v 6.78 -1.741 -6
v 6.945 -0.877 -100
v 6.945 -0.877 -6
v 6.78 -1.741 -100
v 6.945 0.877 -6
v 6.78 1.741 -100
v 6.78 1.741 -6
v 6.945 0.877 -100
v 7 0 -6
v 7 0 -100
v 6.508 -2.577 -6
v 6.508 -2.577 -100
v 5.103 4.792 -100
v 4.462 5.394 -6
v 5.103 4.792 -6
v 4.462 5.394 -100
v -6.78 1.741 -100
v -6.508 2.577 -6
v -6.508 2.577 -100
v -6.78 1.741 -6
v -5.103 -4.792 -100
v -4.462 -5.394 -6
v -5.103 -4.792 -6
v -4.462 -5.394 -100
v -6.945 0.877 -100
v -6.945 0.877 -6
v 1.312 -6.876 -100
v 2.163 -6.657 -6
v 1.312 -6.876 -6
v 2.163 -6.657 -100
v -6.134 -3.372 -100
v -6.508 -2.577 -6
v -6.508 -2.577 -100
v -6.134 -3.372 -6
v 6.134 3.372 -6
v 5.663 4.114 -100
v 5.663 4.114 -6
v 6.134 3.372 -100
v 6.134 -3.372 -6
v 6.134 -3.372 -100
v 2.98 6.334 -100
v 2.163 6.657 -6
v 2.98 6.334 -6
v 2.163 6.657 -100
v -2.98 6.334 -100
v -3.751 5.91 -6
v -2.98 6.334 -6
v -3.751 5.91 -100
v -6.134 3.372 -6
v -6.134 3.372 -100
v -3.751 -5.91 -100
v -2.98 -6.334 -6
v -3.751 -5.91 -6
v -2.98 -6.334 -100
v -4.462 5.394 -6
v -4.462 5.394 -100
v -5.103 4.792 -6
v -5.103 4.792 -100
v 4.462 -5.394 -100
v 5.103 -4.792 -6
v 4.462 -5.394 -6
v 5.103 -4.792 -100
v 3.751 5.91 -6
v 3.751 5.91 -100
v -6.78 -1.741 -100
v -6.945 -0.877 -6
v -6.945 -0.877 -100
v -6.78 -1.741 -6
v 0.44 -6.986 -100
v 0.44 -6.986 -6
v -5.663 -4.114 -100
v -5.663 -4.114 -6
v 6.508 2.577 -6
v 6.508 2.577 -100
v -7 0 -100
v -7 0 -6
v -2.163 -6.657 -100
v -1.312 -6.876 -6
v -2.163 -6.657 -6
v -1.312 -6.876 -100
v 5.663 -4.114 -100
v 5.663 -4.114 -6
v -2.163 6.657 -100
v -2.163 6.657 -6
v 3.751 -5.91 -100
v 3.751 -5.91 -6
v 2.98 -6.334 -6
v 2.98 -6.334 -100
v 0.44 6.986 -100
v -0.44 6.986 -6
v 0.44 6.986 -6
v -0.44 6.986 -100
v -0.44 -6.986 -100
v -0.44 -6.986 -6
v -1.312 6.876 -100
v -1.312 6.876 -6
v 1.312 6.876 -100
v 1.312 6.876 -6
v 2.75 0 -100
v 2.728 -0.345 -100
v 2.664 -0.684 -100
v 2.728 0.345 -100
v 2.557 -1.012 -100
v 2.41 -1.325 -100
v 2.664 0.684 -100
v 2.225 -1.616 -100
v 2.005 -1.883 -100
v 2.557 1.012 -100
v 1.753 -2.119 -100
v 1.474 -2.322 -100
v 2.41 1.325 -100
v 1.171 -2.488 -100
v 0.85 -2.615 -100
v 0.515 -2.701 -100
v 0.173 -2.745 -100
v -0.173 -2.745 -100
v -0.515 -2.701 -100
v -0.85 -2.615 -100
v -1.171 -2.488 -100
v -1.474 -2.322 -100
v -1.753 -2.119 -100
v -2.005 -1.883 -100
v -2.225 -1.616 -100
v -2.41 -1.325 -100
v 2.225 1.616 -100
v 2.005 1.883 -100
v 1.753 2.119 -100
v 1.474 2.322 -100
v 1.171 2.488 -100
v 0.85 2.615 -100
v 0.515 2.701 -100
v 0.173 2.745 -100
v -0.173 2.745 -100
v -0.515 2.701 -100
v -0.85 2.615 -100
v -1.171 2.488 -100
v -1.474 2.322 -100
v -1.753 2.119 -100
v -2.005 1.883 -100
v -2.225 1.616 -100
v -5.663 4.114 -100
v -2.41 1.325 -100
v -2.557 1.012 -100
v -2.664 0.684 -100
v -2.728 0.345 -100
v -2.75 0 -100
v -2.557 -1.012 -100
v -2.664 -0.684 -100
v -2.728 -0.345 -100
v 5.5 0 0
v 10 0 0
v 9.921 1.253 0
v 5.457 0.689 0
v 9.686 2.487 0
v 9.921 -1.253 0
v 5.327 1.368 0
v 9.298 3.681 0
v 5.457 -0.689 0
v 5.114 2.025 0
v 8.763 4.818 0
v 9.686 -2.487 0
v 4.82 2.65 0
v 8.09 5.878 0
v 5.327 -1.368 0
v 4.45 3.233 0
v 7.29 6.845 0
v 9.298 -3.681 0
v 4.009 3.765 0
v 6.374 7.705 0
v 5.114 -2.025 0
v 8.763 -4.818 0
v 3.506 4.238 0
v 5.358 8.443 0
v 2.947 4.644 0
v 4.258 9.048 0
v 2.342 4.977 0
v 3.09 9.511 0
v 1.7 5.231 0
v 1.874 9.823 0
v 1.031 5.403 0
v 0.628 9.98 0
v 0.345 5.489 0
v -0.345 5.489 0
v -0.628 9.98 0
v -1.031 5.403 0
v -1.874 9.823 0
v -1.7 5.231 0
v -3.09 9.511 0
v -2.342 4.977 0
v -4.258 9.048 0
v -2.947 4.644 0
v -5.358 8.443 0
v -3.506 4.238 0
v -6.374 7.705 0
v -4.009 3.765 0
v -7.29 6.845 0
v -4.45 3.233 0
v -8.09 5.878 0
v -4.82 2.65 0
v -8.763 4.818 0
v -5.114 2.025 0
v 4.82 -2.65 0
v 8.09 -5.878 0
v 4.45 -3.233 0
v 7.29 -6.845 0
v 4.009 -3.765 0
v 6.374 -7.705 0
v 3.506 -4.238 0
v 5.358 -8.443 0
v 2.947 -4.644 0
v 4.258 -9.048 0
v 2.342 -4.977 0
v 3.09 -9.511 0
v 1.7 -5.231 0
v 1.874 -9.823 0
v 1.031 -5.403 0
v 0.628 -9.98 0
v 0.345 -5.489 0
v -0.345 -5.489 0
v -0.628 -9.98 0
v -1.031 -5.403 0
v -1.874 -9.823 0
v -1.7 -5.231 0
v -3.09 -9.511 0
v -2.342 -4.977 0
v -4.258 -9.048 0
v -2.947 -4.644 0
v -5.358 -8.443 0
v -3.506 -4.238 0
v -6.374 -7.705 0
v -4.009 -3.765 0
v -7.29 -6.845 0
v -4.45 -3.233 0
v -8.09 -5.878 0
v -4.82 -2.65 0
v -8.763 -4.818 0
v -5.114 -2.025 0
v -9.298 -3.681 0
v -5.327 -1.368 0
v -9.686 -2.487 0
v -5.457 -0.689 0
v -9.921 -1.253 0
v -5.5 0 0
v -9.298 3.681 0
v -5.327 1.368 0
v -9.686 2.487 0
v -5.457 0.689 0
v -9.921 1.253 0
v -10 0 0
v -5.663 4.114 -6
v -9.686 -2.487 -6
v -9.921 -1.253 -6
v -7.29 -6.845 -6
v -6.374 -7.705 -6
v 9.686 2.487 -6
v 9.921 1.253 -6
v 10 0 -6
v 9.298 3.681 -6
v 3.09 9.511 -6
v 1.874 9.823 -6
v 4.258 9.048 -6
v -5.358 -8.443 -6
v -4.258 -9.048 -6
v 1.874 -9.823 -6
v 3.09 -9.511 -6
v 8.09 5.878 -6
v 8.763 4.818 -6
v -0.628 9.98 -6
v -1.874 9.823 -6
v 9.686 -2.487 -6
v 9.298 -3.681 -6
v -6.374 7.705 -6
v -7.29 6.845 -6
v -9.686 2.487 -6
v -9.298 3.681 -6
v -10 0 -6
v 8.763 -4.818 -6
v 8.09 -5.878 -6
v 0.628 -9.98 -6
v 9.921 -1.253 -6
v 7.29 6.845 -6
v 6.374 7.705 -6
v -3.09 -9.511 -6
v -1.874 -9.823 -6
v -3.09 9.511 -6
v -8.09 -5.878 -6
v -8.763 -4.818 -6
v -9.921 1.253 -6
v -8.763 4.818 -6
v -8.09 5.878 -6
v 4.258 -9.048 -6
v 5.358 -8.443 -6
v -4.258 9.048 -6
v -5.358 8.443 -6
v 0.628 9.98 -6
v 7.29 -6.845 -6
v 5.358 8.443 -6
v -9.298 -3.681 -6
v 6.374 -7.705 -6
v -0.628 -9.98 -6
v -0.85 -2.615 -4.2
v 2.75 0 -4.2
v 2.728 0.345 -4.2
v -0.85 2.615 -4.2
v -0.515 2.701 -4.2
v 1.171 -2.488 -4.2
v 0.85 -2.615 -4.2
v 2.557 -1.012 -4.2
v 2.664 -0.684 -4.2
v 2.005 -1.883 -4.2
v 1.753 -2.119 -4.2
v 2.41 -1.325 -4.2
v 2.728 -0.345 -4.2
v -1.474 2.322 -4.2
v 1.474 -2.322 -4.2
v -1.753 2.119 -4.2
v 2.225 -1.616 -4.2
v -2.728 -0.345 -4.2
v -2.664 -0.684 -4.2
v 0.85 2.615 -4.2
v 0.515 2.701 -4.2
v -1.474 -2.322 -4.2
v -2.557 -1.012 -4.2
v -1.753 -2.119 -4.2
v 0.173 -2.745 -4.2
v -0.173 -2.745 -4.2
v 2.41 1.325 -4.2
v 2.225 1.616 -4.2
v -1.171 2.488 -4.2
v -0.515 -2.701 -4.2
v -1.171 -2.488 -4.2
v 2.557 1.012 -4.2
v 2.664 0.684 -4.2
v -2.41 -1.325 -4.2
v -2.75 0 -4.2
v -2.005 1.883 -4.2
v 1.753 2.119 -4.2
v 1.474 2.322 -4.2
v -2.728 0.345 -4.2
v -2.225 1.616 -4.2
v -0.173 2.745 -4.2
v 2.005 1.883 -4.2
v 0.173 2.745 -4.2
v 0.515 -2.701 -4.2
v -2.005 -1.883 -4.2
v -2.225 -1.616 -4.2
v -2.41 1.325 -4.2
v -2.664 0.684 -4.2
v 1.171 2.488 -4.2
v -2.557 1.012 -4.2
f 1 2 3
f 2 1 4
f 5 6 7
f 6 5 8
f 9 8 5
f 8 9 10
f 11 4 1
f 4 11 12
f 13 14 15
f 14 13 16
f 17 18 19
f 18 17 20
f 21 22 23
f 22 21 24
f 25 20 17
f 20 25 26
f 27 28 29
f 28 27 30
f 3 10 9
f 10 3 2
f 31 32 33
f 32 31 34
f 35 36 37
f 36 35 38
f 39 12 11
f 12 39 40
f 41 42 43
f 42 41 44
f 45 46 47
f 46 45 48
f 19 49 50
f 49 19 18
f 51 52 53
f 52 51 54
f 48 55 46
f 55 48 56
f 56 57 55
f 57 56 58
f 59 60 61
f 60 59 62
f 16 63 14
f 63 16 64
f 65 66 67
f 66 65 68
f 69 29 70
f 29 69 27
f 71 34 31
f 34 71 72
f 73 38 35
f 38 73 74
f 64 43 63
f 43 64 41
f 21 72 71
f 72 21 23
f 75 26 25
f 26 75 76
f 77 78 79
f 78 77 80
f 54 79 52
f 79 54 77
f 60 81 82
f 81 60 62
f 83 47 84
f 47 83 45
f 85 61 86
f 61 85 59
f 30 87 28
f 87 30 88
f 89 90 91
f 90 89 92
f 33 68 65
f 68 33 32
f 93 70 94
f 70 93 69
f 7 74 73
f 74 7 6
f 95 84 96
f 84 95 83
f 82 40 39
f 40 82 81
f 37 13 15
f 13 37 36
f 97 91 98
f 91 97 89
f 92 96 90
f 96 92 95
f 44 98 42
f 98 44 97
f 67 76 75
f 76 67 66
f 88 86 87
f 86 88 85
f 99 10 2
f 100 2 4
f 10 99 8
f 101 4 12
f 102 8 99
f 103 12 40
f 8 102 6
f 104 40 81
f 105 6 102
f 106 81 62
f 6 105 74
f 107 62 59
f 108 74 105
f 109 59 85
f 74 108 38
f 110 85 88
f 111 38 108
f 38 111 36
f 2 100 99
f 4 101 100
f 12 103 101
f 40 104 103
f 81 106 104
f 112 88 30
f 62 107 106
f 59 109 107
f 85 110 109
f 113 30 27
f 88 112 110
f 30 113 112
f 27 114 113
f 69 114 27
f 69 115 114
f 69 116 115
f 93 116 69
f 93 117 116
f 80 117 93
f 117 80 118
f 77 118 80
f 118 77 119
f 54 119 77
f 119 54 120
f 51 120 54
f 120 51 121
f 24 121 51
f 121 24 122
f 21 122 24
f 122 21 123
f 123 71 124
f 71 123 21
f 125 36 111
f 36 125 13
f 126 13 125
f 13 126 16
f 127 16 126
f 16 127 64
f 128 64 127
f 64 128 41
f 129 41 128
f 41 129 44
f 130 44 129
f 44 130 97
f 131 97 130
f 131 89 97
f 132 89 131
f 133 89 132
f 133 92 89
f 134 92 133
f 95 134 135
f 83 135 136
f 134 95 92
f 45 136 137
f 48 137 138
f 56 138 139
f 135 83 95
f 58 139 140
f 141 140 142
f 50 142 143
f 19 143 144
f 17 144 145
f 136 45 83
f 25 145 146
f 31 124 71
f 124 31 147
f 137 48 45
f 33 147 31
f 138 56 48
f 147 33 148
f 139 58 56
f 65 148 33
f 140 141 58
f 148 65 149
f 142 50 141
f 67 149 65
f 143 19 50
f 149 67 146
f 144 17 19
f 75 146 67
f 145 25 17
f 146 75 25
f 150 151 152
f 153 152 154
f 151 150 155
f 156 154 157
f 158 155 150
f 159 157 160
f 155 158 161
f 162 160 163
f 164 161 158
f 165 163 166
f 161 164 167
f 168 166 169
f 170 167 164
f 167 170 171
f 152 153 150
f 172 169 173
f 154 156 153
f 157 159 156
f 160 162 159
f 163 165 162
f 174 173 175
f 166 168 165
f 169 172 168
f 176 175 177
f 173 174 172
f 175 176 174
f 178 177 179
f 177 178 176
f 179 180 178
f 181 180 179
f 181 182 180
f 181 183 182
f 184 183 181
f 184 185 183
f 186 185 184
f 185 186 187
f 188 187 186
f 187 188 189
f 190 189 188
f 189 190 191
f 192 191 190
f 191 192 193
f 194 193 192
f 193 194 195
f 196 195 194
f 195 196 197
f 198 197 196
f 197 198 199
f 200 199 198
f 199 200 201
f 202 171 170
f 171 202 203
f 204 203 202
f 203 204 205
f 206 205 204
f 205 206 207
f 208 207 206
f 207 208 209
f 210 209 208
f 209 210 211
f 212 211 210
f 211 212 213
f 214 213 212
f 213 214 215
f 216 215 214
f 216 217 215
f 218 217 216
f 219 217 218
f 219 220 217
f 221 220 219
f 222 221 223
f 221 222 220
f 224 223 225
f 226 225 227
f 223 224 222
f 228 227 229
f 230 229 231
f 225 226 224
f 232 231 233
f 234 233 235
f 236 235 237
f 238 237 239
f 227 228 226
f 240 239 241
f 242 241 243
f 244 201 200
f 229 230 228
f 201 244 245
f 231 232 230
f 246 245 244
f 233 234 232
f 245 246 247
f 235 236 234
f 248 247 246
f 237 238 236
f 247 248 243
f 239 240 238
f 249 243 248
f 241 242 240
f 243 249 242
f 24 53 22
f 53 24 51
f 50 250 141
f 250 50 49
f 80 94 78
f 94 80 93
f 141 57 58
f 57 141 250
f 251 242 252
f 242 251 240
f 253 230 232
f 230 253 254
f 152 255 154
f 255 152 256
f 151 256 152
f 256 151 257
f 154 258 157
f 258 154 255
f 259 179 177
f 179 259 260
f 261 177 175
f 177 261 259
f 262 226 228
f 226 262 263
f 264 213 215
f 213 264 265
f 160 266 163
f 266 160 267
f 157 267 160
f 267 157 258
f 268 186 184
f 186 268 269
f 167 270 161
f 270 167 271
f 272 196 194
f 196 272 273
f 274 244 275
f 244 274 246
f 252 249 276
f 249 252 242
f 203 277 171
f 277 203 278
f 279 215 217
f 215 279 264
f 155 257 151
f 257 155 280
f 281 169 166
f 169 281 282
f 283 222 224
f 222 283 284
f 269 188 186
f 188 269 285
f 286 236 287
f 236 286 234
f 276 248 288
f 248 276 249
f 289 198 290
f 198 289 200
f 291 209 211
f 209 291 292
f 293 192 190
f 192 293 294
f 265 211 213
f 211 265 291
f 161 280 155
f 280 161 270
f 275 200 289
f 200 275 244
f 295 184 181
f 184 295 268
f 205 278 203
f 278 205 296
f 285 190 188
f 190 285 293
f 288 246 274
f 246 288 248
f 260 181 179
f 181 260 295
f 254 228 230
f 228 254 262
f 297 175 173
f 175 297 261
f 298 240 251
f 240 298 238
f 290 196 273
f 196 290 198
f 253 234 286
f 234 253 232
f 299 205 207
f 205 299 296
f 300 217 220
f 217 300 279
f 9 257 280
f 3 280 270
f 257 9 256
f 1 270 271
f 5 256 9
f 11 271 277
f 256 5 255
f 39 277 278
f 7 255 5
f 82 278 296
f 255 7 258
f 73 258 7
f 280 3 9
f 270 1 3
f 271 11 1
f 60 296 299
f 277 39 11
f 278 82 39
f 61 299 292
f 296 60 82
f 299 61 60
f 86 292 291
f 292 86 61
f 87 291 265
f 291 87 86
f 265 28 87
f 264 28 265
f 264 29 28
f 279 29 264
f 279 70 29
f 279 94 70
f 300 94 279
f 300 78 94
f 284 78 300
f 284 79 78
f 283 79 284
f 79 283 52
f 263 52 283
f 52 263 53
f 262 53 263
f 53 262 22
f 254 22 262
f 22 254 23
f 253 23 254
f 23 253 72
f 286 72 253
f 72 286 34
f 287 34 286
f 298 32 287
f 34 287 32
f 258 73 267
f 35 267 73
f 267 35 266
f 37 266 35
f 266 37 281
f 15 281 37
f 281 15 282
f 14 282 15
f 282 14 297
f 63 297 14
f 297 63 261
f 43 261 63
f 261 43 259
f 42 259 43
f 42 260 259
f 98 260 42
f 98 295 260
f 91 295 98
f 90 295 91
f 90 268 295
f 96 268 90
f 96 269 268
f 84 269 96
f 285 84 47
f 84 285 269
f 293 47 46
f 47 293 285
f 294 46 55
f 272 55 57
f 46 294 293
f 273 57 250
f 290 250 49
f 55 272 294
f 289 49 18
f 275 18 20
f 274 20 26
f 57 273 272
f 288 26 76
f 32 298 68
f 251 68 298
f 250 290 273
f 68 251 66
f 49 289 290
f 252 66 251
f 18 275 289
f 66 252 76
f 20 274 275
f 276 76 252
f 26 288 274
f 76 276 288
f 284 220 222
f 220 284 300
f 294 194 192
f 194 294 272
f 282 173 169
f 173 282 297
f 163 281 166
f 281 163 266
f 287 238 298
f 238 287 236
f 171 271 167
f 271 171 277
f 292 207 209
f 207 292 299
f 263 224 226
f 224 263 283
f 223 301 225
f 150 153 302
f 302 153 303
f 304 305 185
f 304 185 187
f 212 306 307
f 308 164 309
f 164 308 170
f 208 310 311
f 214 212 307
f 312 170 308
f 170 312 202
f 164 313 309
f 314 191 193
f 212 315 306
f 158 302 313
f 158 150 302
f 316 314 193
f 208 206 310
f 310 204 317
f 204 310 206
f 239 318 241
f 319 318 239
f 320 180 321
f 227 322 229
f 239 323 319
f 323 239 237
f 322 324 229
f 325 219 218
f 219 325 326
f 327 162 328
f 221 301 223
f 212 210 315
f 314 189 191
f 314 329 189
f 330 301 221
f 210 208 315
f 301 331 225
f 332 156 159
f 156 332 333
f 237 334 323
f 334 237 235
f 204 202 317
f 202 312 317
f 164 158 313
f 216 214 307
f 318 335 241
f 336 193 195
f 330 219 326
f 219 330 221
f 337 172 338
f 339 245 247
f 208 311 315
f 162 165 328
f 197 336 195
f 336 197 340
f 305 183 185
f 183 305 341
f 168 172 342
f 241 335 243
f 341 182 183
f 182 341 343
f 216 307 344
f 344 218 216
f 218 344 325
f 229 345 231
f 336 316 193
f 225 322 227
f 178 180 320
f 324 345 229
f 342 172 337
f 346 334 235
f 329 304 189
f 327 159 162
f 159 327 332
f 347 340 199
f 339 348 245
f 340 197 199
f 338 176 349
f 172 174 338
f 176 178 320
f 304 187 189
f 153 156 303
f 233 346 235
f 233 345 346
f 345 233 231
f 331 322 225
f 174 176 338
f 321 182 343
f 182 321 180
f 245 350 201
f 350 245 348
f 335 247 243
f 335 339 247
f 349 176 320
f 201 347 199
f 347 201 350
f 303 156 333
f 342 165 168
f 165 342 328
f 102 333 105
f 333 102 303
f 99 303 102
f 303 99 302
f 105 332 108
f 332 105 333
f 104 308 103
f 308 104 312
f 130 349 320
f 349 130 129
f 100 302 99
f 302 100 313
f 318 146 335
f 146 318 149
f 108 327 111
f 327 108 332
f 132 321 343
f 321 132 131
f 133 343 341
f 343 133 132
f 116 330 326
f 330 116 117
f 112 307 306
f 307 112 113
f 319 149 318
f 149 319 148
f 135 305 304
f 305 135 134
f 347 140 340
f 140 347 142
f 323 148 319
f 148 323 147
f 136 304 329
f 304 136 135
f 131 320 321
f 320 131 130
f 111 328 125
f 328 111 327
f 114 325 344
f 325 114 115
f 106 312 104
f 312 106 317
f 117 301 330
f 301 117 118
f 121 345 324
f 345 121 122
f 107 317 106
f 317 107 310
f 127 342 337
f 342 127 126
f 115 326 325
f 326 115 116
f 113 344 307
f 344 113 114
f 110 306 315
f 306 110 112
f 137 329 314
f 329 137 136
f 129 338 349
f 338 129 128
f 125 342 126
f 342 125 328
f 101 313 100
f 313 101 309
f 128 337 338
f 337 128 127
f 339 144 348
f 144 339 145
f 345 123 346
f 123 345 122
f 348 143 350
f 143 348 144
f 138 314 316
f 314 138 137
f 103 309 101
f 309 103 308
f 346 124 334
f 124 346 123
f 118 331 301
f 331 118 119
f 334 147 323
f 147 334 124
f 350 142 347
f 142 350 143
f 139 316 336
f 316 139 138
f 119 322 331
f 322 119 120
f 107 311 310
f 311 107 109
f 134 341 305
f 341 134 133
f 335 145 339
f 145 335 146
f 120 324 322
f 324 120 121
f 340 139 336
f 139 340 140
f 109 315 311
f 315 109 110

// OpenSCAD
$fn = 50;


difference() {
	union() {
		translate(v = [0, 0, -100.0000000000]) {
			cylinder(h = 100, r = 7.0000000000);
		}
		translate(v = [0, 0, -6.0000000000]) {
			cylinder(h = 6, r = 10.0000000000);
		}
	}
	union() {
		translate(v = [0, 0, 0]) {
			rotate(a = [0, 0, 0]) {
				difference() {
					union() {
						#translate(v = [0, 0, -100.0000000000]) {
							cylinder(h = 100, r = 2.2500000000);
						}
						#translate(v = [0, 0, -4.2000000000]) {
							cylinder(h = 4.2000000000, r = 7.0000000000, r1 = 2.7500000000, r2 = 5.5000000000);
						}
						#translate(v = [0, 0, -100.0000000000]) {
							cylinder(h = 100, r = 2.7500000000);
						}
						#translate(v = [0, 0, -100.0000000000]) {
							cylinder(h = 100, r = 2.2500000000);
						}
					}
					union();
				}
			}
		}
	}
}
